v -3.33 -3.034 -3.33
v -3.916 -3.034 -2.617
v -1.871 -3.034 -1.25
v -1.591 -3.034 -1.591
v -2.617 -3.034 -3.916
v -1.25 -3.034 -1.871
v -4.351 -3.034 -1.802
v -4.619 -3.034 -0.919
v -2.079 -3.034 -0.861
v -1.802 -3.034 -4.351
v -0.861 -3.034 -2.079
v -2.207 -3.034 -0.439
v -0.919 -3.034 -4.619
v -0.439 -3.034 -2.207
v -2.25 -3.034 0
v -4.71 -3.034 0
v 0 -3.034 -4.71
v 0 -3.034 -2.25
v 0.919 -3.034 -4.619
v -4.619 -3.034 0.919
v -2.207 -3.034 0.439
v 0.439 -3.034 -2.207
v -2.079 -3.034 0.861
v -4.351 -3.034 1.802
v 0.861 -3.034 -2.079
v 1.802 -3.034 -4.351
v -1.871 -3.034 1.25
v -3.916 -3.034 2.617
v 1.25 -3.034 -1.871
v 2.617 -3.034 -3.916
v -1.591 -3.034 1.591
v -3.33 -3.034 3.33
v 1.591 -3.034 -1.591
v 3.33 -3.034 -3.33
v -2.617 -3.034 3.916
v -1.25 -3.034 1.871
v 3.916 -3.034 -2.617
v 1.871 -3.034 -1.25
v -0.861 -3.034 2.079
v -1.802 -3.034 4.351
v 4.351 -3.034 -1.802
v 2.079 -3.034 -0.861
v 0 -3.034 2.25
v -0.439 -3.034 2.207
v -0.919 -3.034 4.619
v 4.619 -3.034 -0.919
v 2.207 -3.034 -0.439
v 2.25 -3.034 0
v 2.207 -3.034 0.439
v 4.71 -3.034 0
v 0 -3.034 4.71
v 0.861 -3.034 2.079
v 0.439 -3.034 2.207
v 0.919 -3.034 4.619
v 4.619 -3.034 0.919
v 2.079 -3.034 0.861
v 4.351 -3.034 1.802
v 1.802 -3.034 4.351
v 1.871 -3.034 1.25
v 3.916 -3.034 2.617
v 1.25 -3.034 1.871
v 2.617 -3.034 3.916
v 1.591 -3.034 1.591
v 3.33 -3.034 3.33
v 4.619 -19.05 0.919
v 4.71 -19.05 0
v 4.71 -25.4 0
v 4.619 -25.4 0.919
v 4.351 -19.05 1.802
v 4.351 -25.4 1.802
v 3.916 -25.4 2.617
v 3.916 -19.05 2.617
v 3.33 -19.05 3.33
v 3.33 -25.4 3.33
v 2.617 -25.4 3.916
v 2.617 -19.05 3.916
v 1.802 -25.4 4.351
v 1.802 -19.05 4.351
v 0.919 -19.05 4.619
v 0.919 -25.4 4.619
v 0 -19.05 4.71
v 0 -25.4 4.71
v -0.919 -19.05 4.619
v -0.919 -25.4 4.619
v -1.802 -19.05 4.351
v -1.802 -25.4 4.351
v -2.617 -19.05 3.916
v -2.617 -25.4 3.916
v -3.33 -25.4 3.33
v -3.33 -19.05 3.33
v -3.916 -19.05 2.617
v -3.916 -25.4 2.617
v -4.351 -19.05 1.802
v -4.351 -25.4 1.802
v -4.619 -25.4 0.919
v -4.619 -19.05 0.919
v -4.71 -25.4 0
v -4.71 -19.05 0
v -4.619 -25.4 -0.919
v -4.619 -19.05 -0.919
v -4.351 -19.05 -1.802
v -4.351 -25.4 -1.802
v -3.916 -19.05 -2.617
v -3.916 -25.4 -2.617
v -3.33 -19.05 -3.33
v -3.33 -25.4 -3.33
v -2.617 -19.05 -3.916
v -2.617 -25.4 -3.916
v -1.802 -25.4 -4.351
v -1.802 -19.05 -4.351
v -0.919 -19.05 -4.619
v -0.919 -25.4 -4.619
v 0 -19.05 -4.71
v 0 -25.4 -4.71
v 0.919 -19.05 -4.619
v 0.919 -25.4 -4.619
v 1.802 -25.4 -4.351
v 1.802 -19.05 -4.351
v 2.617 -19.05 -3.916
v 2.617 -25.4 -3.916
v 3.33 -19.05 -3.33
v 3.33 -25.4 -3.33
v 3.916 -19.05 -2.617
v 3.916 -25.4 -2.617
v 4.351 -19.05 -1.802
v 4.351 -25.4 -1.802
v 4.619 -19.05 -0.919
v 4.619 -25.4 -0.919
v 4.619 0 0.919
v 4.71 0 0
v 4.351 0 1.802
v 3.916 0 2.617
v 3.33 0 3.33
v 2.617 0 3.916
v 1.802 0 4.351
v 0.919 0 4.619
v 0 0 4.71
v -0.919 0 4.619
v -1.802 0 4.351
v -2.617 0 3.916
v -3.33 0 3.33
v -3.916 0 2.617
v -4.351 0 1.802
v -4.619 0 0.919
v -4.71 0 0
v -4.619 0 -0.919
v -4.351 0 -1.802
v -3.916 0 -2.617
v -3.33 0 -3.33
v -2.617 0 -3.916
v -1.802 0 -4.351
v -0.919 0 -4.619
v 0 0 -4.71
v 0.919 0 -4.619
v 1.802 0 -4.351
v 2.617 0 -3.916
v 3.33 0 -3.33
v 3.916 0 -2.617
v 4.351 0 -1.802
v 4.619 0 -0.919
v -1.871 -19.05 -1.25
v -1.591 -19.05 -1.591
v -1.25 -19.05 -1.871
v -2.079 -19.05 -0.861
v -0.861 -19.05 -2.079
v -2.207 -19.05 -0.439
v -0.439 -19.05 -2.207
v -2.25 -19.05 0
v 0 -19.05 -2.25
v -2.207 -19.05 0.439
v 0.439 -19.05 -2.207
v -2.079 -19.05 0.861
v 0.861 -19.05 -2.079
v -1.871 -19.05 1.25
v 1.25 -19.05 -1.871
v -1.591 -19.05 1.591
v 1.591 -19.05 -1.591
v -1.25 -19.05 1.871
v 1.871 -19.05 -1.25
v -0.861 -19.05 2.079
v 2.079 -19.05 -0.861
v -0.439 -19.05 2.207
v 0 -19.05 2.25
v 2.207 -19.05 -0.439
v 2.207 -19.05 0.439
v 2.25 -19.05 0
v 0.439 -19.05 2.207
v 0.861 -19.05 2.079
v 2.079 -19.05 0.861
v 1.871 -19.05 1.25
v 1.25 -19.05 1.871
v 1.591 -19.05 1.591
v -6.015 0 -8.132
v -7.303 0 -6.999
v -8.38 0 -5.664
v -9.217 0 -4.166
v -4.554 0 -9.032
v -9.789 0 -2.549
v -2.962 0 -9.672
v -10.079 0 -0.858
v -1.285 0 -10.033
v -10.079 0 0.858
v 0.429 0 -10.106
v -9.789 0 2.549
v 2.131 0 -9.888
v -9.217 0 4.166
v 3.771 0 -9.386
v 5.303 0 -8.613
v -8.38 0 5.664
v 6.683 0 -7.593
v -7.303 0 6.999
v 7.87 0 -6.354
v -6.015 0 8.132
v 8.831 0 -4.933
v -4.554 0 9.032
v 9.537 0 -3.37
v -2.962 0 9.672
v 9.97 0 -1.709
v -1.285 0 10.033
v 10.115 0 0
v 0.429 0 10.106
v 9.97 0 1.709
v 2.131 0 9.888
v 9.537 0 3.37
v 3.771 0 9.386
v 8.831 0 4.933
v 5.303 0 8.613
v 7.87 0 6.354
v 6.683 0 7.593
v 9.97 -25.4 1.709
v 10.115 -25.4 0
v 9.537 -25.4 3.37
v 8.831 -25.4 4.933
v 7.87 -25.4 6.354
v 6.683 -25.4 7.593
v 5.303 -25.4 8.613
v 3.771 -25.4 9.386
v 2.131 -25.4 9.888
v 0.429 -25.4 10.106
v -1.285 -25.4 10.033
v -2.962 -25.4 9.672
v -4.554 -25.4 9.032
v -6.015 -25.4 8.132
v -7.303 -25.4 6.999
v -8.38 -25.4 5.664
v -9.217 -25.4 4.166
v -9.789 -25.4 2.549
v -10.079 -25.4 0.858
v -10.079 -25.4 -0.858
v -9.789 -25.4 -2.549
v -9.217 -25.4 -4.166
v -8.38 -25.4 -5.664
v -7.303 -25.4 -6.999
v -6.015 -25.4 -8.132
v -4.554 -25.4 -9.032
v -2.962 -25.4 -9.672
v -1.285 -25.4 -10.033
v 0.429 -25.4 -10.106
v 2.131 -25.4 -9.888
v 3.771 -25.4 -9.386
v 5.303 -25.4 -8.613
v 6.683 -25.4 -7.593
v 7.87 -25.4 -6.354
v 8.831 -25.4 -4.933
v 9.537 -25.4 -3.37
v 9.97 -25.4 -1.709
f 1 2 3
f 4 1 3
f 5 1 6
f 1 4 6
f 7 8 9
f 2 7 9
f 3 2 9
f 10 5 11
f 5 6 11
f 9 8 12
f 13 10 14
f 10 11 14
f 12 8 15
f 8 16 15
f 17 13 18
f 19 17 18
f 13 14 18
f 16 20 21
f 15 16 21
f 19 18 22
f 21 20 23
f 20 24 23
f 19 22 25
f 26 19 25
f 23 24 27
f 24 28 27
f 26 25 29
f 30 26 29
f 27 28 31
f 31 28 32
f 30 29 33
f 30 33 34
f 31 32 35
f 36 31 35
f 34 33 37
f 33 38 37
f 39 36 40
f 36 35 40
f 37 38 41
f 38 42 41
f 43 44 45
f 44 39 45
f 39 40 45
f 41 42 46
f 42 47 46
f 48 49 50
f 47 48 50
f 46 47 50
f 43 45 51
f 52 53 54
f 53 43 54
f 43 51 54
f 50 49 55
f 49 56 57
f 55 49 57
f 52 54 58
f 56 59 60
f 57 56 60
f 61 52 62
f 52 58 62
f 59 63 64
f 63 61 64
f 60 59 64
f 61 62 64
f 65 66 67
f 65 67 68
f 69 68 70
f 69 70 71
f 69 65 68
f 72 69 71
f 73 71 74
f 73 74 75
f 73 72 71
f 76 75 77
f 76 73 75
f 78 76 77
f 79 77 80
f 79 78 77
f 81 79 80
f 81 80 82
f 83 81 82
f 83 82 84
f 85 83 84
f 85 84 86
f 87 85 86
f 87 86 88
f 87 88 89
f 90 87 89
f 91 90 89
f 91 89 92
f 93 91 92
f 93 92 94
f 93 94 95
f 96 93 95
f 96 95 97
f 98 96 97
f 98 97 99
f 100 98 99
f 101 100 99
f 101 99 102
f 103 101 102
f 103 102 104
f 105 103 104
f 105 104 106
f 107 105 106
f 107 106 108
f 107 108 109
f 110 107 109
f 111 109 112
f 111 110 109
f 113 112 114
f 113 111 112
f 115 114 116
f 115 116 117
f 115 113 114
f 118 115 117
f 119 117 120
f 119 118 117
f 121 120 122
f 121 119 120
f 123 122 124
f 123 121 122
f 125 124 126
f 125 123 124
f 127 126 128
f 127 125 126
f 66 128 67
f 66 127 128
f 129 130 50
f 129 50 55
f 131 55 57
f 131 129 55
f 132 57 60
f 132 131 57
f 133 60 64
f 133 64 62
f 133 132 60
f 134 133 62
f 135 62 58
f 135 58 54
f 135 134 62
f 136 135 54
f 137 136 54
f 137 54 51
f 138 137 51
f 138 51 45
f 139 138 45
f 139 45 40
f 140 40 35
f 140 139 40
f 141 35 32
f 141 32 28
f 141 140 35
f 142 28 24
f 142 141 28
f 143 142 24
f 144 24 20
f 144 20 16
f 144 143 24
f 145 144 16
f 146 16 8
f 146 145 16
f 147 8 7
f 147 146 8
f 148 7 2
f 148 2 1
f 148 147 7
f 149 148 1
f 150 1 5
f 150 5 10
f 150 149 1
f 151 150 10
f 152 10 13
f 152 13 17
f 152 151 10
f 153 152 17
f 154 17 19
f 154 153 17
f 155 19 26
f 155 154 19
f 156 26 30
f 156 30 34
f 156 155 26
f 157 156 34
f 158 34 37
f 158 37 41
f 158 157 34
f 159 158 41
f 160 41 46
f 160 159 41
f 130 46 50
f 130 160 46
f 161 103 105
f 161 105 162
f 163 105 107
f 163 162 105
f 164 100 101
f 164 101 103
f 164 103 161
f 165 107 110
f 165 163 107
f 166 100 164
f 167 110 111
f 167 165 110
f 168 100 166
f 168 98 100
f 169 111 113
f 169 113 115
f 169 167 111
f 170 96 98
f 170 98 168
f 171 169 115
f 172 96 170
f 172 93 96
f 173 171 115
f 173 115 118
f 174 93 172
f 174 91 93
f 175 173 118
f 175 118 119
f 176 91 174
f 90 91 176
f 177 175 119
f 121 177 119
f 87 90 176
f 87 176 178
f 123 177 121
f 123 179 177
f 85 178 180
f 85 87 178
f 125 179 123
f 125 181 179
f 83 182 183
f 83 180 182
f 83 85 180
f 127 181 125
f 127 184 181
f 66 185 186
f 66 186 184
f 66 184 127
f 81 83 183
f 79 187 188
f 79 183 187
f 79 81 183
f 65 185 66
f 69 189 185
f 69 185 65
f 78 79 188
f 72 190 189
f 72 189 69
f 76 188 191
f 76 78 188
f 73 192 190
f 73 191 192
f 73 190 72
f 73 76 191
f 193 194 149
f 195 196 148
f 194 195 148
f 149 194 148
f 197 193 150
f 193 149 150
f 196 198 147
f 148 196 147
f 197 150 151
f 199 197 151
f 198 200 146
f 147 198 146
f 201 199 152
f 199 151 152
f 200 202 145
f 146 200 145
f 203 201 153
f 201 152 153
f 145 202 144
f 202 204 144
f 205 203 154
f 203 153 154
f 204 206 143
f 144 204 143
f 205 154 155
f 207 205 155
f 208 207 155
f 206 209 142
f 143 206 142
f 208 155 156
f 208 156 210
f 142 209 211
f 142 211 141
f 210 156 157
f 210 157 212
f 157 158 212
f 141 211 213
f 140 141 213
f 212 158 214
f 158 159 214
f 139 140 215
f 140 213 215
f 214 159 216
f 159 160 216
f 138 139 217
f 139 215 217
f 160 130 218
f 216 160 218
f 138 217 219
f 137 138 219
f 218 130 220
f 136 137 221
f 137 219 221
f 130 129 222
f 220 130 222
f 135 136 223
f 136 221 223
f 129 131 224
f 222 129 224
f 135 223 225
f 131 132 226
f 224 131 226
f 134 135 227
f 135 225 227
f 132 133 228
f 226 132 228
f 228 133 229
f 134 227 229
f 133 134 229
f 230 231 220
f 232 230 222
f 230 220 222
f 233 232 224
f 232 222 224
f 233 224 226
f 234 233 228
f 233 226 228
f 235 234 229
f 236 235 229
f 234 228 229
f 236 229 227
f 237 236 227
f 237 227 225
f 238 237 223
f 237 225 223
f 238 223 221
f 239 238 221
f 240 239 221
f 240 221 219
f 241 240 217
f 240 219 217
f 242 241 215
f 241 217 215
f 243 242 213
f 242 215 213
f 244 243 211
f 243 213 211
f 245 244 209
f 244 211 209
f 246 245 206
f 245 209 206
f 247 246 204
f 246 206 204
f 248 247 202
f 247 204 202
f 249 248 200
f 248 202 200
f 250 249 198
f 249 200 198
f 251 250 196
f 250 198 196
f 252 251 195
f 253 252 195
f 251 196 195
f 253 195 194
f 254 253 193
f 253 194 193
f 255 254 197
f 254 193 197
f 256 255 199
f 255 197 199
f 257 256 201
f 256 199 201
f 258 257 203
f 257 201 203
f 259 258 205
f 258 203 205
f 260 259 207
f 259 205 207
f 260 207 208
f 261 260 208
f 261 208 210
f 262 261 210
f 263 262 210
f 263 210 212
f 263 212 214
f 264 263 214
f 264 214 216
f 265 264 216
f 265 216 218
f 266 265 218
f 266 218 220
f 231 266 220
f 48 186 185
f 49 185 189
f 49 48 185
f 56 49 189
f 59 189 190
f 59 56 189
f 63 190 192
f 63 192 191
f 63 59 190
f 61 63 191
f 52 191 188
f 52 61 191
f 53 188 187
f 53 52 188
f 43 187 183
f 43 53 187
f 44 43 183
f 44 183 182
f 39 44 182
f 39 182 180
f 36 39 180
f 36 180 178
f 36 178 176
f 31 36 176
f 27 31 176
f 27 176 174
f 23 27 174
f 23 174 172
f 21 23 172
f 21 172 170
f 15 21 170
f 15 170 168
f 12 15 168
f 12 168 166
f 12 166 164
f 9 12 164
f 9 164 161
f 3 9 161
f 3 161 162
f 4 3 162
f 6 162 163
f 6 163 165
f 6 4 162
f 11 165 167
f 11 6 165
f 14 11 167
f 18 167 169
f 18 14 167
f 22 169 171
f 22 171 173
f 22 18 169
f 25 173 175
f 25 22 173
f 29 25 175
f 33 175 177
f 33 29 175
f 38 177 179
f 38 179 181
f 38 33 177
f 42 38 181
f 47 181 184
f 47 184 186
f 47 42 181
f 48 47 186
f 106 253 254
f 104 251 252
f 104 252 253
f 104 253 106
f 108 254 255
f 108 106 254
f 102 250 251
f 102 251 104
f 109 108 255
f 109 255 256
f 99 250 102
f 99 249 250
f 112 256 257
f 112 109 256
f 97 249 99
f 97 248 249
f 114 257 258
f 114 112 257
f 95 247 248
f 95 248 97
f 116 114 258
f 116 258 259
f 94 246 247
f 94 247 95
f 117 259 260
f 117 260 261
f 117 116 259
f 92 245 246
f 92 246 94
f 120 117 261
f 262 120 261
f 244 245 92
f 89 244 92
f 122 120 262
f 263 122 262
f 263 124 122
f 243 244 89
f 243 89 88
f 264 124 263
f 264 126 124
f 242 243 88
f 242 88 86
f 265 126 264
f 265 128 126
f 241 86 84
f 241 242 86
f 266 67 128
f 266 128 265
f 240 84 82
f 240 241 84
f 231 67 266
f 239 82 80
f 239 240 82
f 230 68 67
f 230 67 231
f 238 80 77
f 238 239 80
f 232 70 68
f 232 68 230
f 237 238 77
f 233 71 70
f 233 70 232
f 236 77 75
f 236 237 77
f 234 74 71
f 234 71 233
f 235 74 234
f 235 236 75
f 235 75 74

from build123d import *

# Parameters (mm, degrees)
F0_R     = 10.115
F0_R_2   = 4.71
F1_DEPTH = 25.4
F0_R_3   = 2.25
F2_DEPTH = 19.05
F3_DEPTH = 3.034123


with BuildPart() as f1:
    # F0 (on Front) → F1 (new body)
    with BuildSketch(Plane.XZ):
        Circle(F0_R)
        Circle(F0_R_2, mode=Mode.SUBTRACT)
    extrude(amount=F1_DEPTH)

    # F0 (on Front) → F2 (join)
    with BuildSketch(Plane.XZ):
        Circle(F0_R_2)
        Circle(F0_R_3, mode=Mode.SUBTRACT)
    extrude(amount=F2_DEPTH)

    # F0 (on Front) → F3 (cut)
    with BuildSketch(Plane.XZ):
        Circle(F0_R_2)
        Circle(F0_R_3, mode=Mode.SUBTRACT)
    extrude(amount=F3_DEPTH, mode=Mode.SUBTRACT)


solid = f1.part
